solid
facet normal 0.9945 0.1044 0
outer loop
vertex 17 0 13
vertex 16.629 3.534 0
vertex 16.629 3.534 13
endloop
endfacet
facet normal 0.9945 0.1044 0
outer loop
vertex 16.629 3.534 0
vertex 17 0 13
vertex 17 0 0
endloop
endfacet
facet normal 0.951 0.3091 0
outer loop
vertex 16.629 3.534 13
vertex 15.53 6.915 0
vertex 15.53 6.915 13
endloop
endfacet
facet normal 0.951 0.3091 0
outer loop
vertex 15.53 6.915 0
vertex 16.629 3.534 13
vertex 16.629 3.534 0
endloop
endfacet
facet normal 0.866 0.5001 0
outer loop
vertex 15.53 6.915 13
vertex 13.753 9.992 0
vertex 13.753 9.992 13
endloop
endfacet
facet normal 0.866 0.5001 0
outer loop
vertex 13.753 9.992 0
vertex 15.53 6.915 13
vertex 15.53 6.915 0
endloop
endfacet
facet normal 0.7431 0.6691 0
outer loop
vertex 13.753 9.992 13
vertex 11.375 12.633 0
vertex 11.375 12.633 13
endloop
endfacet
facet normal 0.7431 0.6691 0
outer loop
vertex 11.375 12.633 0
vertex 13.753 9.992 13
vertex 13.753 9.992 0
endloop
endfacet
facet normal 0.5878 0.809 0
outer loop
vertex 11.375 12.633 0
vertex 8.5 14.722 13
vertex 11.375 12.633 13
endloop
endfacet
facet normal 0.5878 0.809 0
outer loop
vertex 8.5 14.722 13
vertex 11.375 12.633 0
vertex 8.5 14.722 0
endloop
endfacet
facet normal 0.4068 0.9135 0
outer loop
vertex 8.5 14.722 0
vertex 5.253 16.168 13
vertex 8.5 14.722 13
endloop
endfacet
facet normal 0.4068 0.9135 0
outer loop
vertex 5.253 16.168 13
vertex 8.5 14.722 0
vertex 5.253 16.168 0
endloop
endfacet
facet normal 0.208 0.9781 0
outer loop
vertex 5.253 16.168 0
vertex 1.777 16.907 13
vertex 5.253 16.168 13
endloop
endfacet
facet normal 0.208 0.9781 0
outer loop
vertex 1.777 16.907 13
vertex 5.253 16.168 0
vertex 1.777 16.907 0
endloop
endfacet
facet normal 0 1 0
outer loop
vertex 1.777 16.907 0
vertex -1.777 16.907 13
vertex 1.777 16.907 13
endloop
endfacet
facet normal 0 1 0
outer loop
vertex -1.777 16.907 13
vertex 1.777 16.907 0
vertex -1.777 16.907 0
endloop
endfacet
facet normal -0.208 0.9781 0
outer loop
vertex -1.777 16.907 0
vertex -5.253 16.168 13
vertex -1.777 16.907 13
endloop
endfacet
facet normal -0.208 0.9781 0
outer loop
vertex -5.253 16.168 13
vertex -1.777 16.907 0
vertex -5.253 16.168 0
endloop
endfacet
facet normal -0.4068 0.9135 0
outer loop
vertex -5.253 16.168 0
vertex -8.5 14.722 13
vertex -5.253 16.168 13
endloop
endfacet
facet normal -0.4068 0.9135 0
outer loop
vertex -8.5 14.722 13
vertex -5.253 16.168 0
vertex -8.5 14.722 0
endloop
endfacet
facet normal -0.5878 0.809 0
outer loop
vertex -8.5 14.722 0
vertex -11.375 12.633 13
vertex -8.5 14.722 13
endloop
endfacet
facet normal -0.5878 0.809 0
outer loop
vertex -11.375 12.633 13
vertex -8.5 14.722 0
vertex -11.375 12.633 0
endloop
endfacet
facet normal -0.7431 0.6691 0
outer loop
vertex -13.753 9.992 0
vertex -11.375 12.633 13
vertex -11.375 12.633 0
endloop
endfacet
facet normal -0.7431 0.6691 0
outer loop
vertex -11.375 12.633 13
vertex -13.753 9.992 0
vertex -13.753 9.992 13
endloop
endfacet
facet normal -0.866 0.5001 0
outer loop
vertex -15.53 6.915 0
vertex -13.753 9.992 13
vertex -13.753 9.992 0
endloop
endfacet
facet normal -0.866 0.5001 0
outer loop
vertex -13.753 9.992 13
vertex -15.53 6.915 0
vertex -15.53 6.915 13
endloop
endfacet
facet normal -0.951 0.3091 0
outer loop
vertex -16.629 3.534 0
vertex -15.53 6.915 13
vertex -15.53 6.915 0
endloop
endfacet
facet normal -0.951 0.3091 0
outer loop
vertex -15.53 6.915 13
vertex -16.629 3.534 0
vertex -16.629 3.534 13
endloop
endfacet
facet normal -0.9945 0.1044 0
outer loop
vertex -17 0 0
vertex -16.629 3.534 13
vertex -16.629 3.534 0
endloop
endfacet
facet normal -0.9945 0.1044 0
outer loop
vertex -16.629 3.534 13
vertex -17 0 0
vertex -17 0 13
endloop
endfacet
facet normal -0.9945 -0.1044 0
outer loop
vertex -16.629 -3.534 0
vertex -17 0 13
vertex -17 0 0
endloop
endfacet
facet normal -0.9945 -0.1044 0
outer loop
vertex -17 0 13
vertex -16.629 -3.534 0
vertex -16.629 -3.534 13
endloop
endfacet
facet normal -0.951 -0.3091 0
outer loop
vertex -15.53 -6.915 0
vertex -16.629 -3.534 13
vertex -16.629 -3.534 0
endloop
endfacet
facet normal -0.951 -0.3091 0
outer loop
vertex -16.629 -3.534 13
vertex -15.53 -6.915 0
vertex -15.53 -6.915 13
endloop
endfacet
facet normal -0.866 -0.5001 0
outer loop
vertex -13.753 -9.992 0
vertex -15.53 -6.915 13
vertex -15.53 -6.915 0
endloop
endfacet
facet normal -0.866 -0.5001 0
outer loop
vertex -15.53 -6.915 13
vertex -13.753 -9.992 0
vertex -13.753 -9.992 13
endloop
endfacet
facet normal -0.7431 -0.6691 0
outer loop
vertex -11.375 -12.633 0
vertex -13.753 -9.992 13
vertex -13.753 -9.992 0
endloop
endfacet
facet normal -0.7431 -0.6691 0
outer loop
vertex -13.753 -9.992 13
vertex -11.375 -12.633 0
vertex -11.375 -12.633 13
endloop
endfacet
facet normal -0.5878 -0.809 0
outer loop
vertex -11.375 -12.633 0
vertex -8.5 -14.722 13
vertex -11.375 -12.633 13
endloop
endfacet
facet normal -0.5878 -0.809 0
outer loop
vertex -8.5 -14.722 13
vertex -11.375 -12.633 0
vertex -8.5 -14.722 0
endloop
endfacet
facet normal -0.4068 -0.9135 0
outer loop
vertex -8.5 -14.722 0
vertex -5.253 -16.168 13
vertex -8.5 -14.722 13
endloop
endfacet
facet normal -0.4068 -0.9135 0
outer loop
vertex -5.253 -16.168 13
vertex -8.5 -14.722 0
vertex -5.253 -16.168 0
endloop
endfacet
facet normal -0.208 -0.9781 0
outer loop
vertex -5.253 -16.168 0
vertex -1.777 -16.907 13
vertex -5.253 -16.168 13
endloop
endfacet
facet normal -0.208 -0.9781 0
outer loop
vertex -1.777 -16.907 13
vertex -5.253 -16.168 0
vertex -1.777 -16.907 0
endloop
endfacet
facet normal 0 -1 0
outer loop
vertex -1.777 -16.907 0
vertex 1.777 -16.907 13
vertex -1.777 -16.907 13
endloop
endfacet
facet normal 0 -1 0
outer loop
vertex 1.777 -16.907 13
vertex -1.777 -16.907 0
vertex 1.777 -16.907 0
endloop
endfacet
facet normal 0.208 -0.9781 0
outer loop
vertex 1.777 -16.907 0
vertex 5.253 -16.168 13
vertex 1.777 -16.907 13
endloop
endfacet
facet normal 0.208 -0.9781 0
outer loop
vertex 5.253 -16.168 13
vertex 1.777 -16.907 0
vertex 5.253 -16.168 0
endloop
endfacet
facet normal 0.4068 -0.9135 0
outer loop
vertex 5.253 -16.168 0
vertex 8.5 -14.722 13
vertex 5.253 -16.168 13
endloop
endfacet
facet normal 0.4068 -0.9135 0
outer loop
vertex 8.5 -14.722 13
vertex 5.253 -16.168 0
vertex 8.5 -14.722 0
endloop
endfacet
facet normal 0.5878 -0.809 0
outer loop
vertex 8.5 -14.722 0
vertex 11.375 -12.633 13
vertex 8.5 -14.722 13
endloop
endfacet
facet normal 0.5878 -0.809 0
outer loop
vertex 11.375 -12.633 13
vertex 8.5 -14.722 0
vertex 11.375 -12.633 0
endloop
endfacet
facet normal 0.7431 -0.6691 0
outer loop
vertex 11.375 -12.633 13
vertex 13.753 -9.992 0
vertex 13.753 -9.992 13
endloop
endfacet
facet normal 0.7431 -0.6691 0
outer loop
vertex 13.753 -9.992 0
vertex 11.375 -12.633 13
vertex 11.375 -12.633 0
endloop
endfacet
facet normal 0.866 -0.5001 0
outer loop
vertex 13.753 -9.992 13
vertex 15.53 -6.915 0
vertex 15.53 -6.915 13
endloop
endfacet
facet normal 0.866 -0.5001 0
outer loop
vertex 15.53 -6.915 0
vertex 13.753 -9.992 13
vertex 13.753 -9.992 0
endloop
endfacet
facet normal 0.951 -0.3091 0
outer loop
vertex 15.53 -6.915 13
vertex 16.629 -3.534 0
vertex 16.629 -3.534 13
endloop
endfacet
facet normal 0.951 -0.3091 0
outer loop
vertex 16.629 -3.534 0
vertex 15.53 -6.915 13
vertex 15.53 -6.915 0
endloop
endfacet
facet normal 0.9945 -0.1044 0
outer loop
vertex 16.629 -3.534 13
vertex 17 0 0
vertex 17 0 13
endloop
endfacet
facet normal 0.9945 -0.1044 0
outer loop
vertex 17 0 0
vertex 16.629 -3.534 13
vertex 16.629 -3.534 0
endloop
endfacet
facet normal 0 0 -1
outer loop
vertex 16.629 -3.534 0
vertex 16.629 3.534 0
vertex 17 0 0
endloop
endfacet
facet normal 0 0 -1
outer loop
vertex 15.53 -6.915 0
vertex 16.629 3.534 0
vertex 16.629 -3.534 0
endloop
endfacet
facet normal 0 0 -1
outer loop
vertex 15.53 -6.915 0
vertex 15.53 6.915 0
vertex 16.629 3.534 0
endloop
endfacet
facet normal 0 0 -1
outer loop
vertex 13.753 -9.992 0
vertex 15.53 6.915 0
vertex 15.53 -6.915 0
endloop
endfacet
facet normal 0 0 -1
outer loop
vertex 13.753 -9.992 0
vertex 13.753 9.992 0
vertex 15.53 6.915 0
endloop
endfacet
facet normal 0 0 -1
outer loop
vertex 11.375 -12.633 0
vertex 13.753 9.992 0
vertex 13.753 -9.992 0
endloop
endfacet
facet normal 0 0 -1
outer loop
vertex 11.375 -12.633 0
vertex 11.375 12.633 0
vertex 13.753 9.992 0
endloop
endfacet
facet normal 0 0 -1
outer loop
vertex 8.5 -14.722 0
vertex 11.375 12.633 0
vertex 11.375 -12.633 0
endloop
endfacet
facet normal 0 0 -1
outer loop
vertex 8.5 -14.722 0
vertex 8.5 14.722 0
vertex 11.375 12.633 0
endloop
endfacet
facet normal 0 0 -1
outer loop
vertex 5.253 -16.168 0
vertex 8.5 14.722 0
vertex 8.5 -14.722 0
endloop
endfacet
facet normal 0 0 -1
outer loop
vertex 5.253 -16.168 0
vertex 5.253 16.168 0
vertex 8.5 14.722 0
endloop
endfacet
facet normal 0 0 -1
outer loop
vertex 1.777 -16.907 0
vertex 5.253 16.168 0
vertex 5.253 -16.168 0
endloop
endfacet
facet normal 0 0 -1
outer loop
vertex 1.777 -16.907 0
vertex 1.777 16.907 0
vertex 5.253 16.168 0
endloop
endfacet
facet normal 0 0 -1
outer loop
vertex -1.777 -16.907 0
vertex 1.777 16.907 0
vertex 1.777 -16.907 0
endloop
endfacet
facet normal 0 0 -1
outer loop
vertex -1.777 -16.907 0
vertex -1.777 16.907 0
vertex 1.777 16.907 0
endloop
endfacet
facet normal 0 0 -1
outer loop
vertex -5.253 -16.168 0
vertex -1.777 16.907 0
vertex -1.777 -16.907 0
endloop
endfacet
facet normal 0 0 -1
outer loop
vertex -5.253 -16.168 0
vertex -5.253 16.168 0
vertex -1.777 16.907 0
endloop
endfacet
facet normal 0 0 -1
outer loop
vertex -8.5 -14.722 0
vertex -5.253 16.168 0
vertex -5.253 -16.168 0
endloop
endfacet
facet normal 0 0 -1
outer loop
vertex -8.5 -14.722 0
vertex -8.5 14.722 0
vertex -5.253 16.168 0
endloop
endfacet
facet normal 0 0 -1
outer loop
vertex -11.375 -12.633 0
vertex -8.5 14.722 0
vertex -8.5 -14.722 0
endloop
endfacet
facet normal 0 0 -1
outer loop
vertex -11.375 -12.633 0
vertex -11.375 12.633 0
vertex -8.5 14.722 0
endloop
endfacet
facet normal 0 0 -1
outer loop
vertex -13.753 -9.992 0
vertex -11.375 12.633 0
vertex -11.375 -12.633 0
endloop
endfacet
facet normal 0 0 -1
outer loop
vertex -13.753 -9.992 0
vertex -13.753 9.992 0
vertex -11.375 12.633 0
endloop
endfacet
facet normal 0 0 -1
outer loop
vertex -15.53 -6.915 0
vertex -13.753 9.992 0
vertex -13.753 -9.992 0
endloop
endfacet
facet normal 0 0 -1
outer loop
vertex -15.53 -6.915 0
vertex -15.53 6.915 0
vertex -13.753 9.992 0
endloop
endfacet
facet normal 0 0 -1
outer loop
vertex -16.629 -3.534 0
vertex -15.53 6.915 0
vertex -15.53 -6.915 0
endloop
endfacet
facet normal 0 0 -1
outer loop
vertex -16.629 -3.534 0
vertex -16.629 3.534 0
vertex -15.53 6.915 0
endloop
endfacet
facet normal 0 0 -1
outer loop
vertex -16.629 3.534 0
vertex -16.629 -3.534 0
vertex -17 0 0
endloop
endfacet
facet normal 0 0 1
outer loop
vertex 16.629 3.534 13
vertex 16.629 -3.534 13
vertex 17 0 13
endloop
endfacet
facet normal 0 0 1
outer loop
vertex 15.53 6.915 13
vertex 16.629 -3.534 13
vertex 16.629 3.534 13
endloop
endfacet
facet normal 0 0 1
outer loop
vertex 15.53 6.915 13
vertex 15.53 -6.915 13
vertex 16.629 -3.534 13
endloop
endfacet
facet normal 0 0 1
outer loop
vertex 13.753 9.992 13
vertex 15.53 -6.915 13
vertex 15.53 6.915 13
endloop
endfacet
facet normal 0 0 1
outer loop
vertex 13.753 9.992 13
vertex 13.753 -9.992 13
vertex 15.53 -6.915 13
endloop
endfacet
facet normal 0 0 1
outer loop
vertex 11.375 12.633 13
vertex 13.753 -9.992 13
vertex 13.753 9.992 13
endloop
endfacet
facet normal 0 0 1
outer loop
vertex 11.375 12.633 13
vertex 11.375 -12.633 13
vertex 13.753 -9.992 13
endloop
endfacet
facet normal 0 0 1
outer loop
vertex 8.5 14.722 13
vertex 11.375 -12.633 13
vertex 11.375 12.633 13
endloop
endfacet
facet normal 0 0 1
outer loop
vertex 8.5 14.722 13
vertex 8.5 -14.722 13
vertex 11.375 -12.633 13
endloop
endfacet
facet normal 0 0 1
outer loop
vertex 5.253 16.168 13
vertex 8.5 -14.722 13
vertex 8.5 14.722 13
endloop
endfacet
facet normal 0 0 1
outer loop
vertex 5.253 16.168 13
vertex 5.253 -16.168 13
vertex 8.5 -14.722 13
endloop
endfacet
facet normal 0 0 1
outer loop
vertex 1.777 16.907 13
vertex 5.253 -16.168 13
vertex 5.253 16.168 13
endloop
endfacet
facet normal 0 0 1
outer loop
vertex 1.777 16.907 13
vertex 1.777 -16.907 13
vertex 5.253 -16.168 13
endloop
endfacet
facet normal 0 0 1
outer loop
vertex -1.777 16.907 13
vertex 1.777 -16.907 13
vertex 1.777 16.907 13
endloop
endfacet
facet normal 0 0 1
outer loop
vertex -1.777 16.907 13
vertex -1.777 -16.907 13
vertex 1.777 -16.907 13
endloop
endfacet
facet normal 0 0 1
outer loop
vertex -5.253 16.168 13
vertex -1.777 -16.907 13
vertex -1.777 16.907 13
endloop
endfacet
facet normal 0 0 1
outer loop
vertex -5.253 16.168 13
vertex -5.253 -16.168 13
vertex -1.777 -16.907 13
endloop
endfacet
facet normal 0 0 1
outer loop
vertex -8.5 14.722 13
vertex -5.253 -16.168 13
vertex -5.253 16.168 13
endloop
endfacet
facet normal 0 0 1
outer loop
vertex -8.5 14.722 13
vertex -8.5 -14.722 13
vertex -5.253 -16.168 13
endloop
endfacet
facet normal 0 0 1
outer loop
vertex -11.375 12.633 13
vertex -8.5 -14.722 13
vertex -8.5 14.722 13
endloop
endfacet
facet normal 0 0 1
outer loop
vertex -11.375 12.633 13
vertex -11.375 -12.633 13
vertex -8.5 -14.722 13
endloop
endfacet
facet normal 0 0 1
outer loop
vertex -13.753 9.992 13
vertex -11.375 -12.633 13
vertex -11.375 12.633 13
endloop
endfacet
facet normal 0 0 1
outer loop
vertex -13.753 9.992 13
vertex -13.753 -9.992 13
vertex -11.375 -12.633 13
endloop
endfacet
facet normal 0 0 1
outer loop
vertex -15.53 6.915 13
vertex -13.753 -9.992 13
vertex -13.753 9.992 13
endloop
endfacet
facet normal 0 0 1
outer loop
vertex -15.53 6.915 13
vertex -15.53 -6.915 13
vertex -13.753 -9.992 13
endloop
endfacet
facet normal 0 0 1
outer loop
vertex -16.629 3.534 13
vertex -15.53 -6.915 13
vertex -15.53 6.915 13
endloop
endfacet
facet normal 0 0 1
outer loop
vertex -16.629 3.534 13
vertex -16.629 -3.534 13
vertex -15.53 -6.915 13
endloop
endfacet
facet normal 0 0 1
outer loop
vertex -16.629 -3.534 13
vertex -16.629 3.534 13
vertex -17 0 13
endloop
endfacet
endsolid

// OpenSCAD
// Generated by SolidPython 1.0.1 on 2020-07-29 00:39:25


cylinder(h = 13, r1 = 17, r2 = 17);
/***********************************************
*********      SolidPython code:      **********
************************************************
 
# import packages: SolidPython
from solid import *
from solid.utils import *
from itertools import chain, combinations


class Resize:

    def __init__(self, scad_file):
        self.scad_file = scad_file
        #self.scad_file = import_scad(scad_file)
        # cone/cylinder param:
        self.r1 = 0
        self.r2 = 0
        self.h = 0
        # rectangular prism param:
        self.w = 0
        self.l = 0
        # ellipse param:
        self.r = 0

    # import OpenScad code (file name corresponds to shape)


    # classify shape + parameters
    def assign(self, param1, param2, param3):
        if self.scad_file == 'cone.scad':
            self.r1 = param1
            self.r2 = param2
            self.h = param3
        elif self.scad_file == 'cylinder.scad':
            self.r1 = param1
            self.r2 = param2
            self.h = param3
        elif self.scad_file == 'rectangularPrism.scad':
            self.h = param1
            self.l = param2
            self.w = param3
        else:
            self.r = param1
            self.h = param2

    # resize parameters
    def iterate(self):
        x = range(3, 20, 2)
        i = 1
        if self.scad_file == 'cone.scad':
            tempList = list(combinations(x, 2))
            for temp in tempList:
                param1 = temp[0]
                param2 = temp[1]
                filepath = 'produced_scad_files/' + 'cone' + str(param1) + '_' + str(param2) + '_' + '.scad'
                scad_render_to_file(cylinder(h=param1, r1=param2, r2=0), filepath)

        elif self.scad_file == 'cylinder.scad':
            tempList = list(combinations(x, 3))
            for temp in tempList:
                param1 = temp[0]
                param2 = temp[1]
                filepath = 'produced_scad_files/' + 'cylinder' + str(param1) + '_' + str(param2) + '_' + '.scad'
                scad_render_to_file(cylinder(h=param1, r1=param2, r2=param2), filepath)

        elif self.scad_file == 'rectangularPrism.scad':
            tempList = list(combinations(x, 3))
            for temp in tempList:
                param1 = temp[0]
                param2 = temp[1]
                param3 = temp[2]
                filepath = 'produced_scad_files/' + 'rectangularPrism' + str(param1) + '_' + str(param2) + '_' + str(
                    param3) + '.scad'
                scad_render_to_file(cube(size=(param1, param2, param3)), filepath)

        elif self.scad_file == 'ellipse.scad':
            tempList = list(combinations(x, 4))
            for temp in tempList:
                param1 = temp[0]
                param2 = temp[1]
                param3 = temp[2]
                param4 = temp[3]
                filepath = 'produced_scad_files/' + 'ellipse' + str(param1) + '_' + str(param2) + '_' + str(param3) + '_' + str(param4) + '.scad'
                scad_render_to_file(scale([param1, param2, param3])(sphere(r=param4)), filepath)

    def render_to_scadfile(self):
        scad_render_to_file(scad, 'example.scad') 
 
************************************************/
